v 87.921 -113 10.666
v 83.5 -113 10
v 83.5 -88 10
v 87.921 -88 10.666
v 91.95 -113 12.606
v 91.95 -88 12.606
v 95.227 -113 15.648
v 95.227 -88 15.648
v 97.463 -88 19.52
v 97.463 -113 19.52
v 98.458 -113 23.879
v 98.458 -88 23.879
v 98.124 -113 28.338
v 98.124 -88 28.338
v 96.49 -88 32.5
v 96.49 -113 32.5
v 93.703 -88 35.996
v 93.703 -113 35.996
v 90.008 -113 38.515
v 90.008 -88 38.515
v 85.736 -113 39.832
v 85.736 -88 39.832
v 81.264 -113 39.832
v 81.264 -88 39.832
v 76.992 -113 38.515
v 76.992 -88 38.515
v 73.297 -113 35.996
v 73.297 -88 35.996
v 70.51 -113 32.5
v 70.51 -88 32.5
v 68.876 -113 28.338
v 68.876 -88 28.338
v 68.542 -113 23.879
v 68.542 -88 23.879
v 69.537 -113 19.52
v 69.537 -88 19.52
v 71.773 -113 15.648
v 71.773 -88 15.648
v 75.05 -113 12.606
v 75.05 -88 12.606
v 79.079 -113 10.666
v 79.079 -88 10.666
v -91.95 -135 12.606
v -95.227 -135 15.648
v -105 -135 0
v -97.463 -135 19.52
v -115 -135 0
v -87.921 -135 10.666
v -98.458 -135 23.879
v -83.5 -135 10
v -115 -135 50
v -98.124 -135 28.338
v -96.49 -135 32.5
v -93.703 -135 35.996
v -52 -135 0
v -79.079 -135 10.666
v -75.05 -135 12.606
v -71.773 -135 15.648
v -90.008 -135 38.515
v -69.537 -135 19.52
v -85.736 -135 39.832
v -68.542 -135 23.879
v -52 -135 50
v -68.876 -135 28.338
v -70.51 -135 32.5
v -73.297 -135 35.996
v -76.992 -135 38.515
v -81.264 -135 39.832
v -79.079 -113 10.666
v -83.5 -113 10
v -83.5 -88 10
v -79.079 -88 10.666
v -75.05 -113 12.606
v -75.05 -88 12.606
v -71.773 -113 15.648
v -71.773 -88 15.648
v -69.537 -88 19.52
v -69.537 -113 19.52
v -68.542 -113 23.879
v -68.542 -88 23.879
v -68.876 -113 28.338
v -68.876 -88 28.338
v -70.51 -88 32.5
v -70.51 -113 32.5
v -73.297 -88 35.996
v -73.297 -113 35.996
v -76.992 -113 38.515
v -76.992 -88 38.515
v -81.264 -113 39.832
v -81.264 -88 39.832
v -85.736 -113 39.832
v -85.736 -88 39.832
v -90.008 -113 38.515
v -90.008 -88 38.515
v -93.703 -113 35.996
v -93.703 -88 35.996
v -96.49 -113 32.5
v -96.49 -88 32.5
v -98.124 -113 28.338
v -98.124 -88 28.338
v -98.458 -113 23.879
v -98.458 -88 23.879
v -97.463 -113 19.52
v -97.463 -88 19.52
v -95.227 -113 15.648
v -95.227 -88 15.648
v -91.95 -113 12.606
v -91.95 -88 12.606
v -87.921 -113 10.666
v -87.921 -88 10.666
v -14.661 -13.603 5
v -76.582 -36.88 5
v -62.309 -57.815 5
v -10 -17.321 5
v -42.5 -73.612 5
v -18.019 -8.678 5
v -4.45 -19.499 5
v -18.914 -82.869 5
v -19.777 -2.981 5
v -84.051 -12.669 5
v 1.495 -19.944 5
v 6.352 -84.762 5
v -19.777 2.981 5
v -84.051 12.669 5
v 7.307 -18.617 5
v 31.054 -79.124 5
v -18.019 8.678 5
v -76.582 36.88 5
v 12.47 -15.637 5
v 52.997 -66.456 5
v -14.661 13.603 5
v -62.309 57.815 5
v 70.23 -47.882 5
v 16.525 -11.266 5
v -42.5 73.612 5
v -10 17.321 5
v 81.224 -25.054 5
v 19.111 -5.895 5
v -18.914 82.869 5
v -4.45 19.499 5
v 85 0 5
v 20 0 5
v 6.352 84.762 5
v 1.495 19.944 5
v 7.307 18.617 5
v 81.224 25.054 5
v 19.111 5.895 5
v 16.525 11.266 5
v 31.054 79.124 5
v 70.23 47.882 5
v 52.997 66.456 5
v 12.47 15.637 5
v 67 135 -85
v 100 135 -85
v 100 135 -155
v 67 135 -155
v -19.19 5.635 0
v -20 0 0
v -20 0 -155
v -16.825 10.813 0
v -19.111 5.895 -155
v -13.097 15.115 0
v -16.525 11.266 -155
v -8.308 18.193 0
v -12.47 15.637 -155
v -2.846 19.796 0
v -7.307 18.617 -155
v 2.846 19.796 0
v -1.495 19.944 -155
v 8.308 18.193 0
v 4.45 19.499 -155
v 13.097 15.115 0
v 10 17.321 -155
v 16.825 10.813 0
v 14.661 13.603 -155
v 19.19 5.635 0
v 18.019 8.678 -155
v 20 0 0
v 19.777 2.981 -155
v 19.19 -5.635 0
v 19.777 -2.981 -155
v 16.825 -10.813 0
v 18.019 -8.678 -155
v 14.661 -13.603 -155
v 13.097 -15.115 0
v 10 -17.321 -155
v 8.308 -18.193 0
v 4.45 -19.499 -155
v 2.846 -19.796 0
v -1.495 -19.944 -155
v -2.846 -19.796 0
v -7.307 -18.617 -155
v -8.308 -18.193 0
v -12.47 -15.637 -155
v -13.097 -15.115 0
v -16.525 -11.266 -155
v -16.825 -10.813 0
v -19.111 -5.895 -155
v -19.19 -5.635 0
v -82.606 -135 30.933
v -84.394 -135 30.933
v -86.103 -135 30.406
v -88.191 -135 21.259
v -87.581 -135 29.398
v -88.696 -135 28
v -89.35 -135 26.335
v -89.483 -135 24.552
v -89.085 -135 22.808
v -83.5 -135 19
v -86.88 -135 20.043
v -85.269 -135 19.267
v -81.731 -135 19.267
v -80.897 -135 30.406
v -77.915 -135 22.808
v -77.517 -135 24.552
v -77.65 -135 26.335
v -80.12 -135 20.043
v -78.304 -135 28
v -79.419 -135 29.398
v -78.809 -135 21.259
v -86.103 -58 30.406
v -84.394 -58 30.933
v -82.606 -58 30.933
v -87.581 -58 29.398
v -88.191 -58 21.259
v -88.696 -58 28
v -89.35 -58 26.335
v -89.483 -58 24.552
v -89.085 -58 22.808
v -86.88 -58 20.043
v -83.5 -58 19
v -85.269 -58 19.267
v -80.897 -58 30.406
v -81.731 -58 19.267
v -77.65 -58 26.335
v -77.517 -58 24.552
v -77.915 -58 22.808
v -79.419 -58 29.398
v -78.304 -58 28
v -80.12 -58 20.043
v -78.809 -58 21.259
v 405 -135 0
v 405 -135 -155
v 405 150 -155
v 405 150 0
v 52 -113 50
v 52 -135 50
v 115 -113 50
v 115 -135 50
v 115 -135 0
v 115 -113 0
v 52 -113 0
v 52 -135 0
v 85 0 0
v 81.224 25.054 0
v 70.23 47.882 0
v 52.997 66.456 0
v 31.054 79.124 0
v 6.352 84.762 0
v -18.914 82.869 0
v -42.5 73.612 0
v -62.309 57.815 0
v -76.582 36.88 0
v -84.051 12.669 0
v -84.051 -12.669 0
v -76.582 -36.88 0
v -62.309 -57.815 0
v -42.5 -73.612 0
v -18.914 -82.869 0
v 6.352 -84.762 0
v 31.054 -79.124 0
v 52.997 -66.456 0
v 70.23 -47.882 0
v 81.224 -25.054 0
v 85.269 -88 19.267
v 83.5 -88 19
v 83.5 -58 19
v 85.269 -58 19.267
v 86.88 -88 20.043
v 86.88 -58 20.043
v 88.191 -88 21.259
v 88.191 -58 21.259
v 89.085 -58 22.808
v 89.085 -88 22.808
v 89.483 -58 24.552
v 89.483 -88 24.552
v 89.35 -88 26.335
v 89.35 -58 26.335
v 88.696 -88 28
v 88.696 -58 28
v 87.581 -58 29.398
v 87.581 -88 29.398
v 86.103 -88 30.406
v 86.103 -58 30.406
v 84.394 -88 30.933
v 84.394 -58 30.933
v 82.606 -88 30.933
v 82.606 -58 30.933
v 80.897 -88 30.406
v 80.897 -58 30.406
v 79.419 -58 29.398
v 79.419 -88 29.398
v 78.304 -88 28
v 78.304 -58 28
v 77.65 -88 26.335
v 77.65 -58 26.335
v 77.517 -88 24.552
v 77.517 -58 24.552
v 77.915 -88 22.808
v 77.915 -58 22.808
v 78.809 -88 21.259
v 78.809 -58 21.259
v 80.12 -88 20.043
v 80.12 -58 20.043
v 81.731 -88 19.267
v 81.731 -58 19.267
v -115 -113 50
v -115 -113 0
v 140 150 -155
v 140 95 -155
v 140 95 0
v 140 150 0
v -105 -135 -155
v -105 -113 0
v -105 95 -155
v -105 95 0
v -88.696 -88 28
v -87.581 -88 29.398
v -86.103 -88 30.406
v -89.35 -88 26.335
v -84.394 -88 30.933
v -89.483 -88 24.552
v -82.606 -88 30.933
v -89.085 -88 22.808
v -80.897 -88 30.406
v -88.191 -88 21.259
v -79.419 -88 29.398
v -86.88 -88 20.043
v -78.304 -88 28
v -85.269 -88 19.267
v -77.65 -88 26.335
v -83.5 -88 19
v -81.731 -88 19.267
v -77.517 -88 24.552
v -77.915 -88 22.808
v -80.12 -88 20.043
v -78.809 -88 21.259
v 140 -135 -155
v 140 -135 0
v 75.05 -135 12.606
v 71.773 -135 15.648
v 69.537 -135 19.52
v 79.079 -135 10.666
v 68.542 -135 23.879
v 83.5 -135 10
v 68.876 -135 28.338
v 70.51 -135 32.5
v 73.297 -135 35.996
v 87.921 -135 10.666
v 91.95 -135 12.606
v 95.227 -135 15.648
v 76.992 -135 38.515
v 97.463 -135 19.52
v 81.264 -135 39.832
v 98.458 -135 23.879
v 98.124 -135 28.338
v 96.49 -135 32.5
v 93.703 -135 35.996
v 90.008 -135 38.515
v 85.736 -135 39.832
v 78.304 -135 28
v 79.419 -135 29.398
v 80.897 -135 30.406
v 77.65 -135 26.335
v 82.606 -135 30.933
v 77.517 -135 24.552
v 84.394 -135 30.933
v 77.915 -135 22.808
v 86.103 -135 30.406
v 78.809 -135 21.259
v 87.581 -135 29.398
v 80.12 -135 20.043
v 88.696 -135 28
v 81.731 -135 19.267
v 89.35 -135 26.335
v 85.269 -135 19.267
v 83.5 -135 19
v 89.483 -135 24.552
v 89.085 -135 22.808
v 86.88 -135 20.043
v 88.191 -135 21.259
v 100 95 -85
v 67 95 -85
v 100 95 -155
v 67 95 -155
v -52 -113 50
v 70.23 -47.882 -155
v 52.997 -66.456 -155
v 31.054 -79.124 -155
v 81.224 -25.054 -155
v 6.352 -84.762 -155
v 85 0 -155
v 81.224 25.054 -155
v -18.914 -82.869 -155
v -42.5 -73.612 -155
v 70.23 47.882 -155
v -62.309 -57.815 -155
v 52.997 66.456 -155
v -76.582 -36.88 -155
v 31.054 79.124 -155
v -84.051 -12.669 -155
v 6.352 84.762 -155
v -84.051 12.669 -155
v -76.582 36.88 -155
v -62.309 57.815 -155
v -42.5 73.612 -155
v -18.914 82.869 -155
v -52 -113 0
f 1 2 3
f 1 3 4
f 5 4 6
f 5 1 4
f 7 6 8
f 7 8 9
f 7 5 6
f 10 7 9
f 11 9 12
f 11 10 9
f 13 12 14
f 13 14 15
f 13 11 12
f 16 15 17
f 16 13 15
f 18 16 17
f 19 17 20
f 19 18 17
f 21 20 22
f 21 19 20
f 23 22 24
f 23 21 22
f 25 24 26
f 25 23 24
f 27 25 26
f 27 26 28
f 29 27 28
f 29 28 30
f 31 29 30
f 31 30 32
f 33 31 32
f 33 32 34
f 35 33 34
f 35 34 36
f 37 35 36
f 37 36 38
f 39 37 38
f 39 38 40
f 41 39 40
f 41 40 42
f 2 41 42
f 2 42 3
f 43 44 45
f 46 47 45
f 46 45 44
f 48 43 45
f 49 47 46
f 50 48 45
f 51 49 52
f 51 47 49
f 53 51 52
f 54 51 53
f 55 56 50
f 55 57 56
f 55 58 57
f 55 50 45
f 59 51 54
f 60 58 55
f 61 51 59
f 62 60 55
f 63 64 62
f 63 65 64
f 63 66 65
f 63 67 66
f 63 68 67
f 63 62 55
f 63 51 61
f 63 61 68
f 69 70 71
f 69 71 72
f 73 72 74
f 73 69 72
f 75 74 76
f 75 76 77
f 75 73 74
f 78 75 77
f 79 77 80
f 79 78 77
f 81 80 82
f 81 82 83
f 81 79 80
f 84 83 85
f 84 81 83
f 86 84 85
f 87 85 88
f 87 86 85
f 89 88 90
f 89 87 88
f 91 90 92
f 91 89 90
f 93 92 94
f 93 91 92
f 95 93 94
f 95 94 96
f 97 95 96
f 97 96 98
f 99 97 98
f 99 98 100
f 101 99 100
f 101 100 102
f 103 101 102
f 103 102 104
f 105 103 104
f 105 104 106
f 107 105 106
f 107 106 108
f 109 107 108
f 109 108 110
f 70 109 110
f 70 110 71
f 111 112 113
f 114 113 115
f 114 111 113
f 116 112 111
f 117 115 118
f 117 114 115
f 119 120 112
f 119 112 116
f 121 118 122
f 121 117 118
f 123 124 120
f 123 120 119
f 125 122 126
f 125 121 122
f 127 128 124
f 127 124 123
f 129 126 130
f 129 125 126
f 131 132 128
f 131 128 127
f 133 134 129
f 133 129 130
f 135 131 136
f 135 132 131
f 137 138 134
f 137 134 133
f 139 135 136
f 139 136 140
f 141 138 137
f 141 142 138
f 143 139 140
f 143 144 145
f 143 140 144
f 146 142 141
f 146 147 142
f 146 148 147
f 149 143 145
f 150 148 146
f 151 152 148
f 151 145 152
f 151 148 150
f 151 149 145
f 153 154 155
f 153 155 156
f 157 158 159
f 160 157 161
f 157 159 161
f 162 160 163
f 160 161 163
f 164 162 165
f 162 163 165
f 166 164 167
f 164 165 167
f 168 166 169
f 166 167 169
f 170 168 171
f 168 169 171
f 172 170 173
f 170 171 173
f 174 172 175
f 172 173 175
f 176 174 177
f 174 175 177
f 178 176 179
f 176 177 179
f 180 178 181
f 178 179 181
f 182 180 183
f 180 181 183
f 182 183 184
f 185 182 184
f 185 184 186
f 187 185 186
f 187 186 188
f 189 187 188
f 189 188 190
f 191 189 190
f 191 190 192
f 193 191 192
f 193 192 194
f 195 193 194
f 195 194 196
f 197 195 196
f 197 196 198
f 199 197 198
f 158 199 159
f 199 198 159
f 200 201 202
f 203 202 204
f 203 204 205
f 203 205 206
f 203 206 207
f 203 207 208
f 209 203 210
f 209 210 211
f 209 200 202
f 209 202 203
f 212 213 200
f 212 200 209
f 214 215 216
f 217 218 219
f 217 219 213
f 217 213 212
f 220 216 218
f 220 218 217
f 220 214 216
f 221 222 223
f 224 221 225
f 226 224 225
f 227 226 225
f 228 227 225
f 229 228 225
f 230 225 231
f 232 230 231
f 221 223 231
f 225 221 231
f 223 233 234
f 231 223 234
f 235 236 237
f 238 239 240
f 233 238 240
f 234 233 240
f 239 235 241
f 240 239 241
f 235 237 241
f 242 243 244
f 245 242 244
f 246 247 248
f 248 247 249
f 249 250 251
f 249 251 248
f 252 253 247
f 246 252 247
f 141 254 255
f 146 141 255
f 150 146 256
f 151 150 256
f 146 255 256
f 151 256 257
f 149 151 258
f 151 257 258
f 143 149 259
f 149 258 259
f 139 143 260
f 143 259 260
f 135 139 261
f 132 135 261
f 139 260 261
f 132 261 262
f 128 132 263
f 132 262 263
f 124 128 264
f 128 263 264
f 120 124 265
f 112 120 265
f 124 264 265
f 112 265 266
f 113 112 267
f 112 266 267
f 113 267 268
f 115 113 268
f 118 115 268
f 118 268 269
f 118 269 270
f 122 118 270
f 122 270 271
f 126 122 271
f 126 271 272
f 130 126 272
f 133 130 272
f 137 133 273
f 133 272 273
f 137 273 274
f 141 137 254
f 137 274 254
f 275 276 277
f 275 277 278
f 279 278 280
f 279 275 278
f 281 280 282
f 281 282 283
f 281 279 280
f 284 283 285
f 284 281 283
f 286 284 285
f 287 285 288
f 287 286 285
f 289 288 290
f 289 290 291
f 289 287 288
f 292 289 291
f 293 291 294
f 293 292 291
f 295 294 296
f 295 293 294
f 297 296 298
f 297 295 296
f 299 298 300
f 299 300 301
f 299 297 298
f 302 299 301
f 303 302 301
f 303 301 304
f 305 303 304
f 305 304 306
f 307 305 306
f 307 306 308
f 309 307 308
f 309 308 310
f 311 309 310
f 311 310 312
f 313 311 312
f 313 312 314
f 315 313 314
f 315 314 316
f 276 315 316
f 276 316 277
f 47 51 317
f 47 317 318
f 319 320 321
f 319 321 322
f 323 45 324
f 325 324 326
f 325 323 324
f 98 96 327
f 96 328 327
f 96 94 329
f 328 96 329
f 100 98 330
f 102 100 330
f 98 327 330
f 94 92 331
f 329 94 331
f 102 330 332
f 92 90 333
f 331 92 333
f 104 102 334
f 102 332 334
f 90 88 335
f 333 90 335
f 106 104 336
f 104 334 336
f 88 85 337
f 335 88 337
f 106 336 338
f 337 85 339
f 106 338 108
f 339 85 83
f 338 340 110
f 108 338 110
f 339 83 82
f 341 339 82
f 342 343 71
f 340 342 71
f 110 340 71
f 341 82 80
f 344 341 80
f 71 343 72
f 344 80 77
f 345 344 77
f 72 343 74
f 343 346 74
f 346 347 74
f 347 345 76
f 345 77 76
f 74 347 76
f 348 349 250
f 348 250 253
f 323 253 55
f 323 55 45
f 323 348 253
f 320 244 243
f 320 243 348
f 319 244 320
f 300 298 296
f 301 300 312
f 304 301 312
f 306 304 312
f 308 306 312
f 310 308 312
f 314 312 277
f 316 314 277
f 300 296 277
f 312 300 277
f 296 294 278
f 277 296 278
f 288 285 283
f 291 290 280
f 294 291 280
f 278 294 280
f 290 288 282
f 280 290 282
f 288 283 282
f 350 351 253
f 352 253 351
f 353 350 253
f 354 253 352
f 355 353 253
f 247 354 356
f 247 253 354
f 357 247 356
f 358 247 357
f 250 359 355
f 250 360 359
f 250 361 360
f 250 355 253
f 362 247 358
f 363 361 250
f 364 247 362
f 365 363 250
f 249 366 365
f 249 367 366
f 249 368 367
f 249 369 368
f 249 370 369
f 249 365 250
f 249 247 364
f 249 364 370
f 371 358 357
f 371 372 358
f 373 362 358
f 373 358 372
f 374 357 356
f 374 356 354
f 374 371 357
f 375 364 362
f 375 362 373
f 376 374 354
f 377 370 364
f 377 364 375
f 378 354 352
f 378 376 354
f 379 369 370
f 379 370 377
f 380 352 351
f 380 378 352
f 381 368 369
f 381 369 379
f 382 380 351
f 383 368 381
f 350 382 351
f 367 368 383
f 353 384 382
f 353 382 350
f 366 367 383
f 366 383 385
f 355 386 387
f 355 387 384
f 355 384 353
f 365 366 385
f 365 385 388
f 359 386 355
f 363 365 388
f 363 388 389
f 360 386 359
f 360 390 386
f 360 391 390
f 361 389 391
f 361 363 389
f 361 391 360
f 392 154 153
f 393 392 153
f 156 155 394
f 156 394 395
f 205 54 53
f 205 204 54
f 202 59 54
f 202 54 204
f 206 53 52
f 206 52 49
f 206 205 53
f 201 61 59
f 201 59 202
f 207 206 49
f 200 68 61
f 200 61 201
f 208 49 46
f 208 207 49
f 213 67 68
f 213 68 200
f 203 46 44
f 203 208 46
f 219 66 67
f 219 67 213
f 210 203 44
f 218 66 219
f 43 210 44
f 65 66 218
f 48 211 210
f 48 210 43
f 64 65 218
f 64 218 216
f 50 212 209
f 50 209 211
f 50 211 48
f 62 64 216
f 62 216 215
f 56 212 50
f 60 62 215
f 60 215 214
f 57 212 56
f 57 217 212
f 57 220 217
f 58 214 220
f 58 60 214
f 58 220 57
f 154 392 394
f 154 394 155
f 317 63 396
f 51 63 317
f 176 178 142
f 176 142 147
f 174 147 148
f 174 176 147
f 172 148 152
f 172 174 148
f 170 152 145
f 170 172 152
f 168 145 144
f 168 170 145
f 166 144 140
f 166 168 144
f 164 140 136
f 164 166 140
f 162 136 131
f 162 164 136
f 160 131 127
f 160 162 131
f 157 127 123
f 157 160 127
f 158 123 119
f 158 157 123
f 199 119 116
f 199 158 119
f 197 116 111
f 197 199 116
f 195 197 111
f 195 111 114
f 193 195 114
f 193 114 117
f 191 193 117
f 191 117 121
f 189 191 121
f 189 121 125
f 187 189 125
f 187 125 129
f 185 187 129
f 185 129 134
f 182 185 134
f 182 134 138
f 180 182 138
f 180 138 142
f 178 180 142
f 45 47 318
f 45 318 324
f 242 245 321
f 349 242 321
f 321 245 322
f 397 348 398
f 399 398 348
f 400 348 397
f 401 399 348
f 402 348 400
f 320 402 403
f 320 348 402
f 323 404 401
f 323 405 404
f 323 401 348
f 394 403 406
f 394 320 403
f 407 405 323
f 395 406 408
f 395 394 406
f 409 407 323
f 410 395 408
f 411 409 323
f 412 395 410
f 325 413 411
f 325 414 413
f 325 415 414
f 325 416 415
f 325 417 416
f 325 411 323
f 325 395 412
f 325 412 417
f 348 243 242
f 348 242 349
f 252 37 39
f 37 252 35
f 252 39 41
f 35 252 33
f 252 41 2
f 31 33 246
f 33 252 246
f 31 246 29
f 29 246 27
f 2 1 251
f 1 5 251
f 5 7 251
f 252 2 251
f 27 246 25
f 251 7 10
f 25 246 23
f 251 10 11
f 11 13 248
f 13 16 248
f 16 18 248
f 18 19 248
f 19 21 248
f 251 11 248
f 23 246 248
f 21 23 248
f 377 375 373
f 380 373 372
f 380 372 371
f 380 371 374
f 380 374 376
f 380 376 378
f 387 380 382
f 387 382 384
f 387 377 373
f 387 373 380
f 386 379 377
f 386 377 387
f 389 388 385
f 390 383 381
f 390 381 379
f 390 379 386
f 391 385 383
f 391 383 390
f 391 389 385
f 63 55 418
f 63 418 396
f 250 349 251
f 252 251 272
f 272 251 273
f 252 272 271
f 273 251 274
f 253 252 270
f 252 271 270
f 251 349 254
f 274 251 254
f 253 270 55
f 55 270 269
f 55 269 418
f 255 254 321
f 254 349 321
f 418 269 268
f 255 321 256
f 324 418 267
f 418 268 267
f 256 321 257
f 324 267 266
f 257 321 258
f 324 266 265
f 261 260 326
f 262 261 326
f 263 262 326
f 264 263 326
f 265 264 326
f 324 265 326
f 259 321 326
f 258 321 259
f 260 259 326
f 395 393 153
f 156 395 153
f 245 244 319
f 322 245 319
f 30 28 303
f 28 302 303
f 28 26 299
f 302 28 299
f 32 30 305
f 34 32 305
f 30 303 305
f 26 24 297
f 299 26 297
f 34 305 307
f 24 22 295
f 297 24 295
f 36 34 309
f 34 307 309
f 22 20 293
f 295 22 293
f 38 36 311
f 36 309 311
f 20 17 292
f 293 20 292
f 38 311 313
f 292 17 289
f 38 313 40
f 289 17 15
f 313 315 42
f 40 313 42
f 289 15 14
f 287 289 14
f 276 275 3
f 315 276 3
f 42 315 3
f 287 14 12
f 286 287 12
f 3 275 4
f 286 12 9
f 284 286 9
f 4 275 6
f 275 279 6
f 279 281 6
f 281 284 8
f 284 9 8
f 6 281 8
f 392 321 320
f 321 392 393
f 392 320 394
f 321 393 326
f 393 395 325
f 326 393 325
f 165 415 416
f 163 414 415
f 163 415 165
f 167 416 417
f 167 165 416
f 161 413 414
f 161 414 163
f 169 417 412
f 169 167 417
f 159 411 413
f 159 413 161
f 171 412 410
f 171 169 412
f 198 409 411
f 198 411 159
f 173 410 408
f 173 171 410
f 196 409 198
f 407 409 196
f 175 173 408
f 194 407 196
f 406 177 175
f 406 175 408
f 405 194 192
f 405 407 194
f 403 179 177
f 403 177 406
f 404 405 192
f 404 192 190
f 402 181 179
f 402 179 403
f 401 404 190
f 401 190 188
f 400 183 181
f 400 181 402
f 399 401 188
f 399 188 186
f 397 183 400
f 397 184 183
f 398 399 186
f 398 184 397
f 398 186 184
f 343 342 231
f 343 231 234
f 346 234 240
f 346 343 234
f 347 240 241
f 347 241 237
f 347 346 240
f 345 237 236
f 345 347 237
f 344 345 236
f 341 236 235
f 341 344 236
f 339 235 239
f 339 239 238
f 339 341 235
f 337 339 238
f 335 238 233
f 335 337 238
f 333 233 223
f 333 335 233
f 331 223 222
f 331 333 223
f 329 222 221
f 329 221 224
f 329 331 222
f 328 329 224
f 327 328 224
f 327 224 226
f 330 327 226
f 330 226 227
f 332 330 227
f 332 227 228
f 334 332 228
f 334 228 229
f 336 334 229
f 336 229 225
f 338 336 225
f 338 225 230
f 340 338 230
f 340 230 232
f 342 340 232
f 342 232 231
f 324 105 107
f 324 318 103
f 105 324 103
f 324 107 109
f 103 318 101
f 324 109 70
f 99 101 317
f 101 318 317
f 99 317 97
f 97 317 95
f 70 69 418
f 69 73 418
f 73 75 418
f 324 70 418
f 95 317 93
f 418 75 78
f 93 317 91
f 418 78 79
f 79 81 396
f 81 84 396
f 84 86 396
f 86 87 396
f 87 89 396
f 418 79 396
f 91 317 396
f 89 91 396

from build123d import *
from build123d.topology import SkipClean

# Parameters (mm, degrees)
SKETCH2_R           = 85
SKETCH2_R_2         = 20
BOSS_EXTRUDE1_DEPTH = 5
BOSS_EXTRUDE2_START = 155
SKETCH3_R           = 20
BOSS_EXTRUDE2_DEPTH = 155
SKETCH4_W           = 33
SKETCH4_H           = 40
BOSS_EXTRUDE4_DEPTH = 70
SKETCH6_W           = 63
SKETCH6_H           = 50
SKETCH6_R           = 15
BOSS_EXTRUDE6_DEPTH = 22
SKETCH6_3_R         = 15
SKETCH6_3_R_2       = 6
BOSS_EXTRUDE7_DEPTH = 47
SKETCH6_4_R         = 6
BOSS_EXTRUDE8_DEPTH = 77


with BuildPart() as part:
    # Sketch2 → Boss-Extrude1 (new body)
    with BuildSketch(Plane.XY):
        Circle(SKETCH2_R)
        Circle(SKETCH2_R_2, mode=Mode.SUBTRACT)
    extrude(amount=BOSS_EXTRUDE1_DEPTH)

    # Sketch3 → Boss-Extrude2 (add)
    with SkipClean():  # the faces are left unmerged after this step: merging them gives an invalid solid
        with BuildSketch(Plane(origin=(0, 0, 0), x_dir=(-1, 0, 0), z_dir=(0, 0, -1)).offset(BOSS_EXTRUDE2_START)):
            Polygon((-140, 150), (-405, 150), (-405, -135), (105, -135), (105, 95), (-140, 95), align=None)
            Circle(SKETCH3_R, mode=Mode.SUBTRACT)
        extrude(amount=-BOSS_EXTRUDE2_DEPTH)

    # Sketch4 → Boss-Extrude4 (add)
    with SkipClean():  # the faces are left unmerged after this step: merging them gives an invalid solid
        with BuildSketch(Plane(origin=(0, 0, -155), x_dir=(-1, 0, 0), z_dir=(0, 0, -1))):
            with Locations((-83.5, 115)):
                Rectangle(SKETCH4_W, SKETCH4_H)
        extrude(amount=-BOSS_EXTRUDE4_DEPTH)

    # Sketch6 → Boss-Extrude6 (add)
    # profile 1 of 2: a face of its own
    with SkipClean():  # the faces are left unmerged after this step: merging them gives an invalid solid
        with BuildSketch(Plane.XZ.offset(135)):
            with Locations((-83.5, 25)):
                Rectangle(SKETCH6_W, SKETCH6_H)
            with Locations((-83.5, 25)):
                Circle(SKETCH6_R, mode=Mode.SUBTRACT)
        # profile 2 of 2: a face of its own
        with BuildSketch(Plane.XZ.offset(135)):
            with Locations((83.5, 25)):
                Rectangle(SKETCH6_W, SKETCH6_H)
            with Locations((83.5, 25)):
                Circle(SKETCH6_R, mode=Mode.SUBTRACT)
        extrude(amount=-BOSS_EXTRUDE6_DEPTH)

    # Sketch6<3> → Boss-Extrude7 (add)
    # profile 1 of 2: a face of its own
    with SkipClean():  # the faces are left unmerged after this step: merging them gives an invalid solid
        with BuildSketch(Plane.XZ.offset(135)):
            with Locations((-83.5, 25)):
                Circle(SKETCH6_3_R)
            with Locations((-83.5, 25)):
                Circle(SKETCH6_3_R_2, mode=Mode.SUBTRACT)
        # profile 2 of 2: a face of its own
        with BuildSketch(Plane.XZ.offset(135)):
            with Locations((83.5, 25)):
                Circle(SKETCH6_3_R)
            with Locations((83.5, 25)):
                Circle(SKETCH6_3_R_2, mode=Mode.SUBTRACT)
        extrude(amount=-BOSS_EXTRUDE7_DEPTH)

    # Sketch6<4> → Boss-Extrude8 (add)
    with SkipClean():  # the faces are left unmerged after this step: merging them gives an invalid solid
        with BuildSketch(Plane.XZ.offset(135)):
            with Locations((-83.5, 25)):
                Circle(SKETCH6_4_R)
            with Locations((83.5, 25)):
                Circle(SKETCH6_4_R)
        extrude(amount=-BOSS_EXTRUDE8_DEPTH)


solid = part.part
